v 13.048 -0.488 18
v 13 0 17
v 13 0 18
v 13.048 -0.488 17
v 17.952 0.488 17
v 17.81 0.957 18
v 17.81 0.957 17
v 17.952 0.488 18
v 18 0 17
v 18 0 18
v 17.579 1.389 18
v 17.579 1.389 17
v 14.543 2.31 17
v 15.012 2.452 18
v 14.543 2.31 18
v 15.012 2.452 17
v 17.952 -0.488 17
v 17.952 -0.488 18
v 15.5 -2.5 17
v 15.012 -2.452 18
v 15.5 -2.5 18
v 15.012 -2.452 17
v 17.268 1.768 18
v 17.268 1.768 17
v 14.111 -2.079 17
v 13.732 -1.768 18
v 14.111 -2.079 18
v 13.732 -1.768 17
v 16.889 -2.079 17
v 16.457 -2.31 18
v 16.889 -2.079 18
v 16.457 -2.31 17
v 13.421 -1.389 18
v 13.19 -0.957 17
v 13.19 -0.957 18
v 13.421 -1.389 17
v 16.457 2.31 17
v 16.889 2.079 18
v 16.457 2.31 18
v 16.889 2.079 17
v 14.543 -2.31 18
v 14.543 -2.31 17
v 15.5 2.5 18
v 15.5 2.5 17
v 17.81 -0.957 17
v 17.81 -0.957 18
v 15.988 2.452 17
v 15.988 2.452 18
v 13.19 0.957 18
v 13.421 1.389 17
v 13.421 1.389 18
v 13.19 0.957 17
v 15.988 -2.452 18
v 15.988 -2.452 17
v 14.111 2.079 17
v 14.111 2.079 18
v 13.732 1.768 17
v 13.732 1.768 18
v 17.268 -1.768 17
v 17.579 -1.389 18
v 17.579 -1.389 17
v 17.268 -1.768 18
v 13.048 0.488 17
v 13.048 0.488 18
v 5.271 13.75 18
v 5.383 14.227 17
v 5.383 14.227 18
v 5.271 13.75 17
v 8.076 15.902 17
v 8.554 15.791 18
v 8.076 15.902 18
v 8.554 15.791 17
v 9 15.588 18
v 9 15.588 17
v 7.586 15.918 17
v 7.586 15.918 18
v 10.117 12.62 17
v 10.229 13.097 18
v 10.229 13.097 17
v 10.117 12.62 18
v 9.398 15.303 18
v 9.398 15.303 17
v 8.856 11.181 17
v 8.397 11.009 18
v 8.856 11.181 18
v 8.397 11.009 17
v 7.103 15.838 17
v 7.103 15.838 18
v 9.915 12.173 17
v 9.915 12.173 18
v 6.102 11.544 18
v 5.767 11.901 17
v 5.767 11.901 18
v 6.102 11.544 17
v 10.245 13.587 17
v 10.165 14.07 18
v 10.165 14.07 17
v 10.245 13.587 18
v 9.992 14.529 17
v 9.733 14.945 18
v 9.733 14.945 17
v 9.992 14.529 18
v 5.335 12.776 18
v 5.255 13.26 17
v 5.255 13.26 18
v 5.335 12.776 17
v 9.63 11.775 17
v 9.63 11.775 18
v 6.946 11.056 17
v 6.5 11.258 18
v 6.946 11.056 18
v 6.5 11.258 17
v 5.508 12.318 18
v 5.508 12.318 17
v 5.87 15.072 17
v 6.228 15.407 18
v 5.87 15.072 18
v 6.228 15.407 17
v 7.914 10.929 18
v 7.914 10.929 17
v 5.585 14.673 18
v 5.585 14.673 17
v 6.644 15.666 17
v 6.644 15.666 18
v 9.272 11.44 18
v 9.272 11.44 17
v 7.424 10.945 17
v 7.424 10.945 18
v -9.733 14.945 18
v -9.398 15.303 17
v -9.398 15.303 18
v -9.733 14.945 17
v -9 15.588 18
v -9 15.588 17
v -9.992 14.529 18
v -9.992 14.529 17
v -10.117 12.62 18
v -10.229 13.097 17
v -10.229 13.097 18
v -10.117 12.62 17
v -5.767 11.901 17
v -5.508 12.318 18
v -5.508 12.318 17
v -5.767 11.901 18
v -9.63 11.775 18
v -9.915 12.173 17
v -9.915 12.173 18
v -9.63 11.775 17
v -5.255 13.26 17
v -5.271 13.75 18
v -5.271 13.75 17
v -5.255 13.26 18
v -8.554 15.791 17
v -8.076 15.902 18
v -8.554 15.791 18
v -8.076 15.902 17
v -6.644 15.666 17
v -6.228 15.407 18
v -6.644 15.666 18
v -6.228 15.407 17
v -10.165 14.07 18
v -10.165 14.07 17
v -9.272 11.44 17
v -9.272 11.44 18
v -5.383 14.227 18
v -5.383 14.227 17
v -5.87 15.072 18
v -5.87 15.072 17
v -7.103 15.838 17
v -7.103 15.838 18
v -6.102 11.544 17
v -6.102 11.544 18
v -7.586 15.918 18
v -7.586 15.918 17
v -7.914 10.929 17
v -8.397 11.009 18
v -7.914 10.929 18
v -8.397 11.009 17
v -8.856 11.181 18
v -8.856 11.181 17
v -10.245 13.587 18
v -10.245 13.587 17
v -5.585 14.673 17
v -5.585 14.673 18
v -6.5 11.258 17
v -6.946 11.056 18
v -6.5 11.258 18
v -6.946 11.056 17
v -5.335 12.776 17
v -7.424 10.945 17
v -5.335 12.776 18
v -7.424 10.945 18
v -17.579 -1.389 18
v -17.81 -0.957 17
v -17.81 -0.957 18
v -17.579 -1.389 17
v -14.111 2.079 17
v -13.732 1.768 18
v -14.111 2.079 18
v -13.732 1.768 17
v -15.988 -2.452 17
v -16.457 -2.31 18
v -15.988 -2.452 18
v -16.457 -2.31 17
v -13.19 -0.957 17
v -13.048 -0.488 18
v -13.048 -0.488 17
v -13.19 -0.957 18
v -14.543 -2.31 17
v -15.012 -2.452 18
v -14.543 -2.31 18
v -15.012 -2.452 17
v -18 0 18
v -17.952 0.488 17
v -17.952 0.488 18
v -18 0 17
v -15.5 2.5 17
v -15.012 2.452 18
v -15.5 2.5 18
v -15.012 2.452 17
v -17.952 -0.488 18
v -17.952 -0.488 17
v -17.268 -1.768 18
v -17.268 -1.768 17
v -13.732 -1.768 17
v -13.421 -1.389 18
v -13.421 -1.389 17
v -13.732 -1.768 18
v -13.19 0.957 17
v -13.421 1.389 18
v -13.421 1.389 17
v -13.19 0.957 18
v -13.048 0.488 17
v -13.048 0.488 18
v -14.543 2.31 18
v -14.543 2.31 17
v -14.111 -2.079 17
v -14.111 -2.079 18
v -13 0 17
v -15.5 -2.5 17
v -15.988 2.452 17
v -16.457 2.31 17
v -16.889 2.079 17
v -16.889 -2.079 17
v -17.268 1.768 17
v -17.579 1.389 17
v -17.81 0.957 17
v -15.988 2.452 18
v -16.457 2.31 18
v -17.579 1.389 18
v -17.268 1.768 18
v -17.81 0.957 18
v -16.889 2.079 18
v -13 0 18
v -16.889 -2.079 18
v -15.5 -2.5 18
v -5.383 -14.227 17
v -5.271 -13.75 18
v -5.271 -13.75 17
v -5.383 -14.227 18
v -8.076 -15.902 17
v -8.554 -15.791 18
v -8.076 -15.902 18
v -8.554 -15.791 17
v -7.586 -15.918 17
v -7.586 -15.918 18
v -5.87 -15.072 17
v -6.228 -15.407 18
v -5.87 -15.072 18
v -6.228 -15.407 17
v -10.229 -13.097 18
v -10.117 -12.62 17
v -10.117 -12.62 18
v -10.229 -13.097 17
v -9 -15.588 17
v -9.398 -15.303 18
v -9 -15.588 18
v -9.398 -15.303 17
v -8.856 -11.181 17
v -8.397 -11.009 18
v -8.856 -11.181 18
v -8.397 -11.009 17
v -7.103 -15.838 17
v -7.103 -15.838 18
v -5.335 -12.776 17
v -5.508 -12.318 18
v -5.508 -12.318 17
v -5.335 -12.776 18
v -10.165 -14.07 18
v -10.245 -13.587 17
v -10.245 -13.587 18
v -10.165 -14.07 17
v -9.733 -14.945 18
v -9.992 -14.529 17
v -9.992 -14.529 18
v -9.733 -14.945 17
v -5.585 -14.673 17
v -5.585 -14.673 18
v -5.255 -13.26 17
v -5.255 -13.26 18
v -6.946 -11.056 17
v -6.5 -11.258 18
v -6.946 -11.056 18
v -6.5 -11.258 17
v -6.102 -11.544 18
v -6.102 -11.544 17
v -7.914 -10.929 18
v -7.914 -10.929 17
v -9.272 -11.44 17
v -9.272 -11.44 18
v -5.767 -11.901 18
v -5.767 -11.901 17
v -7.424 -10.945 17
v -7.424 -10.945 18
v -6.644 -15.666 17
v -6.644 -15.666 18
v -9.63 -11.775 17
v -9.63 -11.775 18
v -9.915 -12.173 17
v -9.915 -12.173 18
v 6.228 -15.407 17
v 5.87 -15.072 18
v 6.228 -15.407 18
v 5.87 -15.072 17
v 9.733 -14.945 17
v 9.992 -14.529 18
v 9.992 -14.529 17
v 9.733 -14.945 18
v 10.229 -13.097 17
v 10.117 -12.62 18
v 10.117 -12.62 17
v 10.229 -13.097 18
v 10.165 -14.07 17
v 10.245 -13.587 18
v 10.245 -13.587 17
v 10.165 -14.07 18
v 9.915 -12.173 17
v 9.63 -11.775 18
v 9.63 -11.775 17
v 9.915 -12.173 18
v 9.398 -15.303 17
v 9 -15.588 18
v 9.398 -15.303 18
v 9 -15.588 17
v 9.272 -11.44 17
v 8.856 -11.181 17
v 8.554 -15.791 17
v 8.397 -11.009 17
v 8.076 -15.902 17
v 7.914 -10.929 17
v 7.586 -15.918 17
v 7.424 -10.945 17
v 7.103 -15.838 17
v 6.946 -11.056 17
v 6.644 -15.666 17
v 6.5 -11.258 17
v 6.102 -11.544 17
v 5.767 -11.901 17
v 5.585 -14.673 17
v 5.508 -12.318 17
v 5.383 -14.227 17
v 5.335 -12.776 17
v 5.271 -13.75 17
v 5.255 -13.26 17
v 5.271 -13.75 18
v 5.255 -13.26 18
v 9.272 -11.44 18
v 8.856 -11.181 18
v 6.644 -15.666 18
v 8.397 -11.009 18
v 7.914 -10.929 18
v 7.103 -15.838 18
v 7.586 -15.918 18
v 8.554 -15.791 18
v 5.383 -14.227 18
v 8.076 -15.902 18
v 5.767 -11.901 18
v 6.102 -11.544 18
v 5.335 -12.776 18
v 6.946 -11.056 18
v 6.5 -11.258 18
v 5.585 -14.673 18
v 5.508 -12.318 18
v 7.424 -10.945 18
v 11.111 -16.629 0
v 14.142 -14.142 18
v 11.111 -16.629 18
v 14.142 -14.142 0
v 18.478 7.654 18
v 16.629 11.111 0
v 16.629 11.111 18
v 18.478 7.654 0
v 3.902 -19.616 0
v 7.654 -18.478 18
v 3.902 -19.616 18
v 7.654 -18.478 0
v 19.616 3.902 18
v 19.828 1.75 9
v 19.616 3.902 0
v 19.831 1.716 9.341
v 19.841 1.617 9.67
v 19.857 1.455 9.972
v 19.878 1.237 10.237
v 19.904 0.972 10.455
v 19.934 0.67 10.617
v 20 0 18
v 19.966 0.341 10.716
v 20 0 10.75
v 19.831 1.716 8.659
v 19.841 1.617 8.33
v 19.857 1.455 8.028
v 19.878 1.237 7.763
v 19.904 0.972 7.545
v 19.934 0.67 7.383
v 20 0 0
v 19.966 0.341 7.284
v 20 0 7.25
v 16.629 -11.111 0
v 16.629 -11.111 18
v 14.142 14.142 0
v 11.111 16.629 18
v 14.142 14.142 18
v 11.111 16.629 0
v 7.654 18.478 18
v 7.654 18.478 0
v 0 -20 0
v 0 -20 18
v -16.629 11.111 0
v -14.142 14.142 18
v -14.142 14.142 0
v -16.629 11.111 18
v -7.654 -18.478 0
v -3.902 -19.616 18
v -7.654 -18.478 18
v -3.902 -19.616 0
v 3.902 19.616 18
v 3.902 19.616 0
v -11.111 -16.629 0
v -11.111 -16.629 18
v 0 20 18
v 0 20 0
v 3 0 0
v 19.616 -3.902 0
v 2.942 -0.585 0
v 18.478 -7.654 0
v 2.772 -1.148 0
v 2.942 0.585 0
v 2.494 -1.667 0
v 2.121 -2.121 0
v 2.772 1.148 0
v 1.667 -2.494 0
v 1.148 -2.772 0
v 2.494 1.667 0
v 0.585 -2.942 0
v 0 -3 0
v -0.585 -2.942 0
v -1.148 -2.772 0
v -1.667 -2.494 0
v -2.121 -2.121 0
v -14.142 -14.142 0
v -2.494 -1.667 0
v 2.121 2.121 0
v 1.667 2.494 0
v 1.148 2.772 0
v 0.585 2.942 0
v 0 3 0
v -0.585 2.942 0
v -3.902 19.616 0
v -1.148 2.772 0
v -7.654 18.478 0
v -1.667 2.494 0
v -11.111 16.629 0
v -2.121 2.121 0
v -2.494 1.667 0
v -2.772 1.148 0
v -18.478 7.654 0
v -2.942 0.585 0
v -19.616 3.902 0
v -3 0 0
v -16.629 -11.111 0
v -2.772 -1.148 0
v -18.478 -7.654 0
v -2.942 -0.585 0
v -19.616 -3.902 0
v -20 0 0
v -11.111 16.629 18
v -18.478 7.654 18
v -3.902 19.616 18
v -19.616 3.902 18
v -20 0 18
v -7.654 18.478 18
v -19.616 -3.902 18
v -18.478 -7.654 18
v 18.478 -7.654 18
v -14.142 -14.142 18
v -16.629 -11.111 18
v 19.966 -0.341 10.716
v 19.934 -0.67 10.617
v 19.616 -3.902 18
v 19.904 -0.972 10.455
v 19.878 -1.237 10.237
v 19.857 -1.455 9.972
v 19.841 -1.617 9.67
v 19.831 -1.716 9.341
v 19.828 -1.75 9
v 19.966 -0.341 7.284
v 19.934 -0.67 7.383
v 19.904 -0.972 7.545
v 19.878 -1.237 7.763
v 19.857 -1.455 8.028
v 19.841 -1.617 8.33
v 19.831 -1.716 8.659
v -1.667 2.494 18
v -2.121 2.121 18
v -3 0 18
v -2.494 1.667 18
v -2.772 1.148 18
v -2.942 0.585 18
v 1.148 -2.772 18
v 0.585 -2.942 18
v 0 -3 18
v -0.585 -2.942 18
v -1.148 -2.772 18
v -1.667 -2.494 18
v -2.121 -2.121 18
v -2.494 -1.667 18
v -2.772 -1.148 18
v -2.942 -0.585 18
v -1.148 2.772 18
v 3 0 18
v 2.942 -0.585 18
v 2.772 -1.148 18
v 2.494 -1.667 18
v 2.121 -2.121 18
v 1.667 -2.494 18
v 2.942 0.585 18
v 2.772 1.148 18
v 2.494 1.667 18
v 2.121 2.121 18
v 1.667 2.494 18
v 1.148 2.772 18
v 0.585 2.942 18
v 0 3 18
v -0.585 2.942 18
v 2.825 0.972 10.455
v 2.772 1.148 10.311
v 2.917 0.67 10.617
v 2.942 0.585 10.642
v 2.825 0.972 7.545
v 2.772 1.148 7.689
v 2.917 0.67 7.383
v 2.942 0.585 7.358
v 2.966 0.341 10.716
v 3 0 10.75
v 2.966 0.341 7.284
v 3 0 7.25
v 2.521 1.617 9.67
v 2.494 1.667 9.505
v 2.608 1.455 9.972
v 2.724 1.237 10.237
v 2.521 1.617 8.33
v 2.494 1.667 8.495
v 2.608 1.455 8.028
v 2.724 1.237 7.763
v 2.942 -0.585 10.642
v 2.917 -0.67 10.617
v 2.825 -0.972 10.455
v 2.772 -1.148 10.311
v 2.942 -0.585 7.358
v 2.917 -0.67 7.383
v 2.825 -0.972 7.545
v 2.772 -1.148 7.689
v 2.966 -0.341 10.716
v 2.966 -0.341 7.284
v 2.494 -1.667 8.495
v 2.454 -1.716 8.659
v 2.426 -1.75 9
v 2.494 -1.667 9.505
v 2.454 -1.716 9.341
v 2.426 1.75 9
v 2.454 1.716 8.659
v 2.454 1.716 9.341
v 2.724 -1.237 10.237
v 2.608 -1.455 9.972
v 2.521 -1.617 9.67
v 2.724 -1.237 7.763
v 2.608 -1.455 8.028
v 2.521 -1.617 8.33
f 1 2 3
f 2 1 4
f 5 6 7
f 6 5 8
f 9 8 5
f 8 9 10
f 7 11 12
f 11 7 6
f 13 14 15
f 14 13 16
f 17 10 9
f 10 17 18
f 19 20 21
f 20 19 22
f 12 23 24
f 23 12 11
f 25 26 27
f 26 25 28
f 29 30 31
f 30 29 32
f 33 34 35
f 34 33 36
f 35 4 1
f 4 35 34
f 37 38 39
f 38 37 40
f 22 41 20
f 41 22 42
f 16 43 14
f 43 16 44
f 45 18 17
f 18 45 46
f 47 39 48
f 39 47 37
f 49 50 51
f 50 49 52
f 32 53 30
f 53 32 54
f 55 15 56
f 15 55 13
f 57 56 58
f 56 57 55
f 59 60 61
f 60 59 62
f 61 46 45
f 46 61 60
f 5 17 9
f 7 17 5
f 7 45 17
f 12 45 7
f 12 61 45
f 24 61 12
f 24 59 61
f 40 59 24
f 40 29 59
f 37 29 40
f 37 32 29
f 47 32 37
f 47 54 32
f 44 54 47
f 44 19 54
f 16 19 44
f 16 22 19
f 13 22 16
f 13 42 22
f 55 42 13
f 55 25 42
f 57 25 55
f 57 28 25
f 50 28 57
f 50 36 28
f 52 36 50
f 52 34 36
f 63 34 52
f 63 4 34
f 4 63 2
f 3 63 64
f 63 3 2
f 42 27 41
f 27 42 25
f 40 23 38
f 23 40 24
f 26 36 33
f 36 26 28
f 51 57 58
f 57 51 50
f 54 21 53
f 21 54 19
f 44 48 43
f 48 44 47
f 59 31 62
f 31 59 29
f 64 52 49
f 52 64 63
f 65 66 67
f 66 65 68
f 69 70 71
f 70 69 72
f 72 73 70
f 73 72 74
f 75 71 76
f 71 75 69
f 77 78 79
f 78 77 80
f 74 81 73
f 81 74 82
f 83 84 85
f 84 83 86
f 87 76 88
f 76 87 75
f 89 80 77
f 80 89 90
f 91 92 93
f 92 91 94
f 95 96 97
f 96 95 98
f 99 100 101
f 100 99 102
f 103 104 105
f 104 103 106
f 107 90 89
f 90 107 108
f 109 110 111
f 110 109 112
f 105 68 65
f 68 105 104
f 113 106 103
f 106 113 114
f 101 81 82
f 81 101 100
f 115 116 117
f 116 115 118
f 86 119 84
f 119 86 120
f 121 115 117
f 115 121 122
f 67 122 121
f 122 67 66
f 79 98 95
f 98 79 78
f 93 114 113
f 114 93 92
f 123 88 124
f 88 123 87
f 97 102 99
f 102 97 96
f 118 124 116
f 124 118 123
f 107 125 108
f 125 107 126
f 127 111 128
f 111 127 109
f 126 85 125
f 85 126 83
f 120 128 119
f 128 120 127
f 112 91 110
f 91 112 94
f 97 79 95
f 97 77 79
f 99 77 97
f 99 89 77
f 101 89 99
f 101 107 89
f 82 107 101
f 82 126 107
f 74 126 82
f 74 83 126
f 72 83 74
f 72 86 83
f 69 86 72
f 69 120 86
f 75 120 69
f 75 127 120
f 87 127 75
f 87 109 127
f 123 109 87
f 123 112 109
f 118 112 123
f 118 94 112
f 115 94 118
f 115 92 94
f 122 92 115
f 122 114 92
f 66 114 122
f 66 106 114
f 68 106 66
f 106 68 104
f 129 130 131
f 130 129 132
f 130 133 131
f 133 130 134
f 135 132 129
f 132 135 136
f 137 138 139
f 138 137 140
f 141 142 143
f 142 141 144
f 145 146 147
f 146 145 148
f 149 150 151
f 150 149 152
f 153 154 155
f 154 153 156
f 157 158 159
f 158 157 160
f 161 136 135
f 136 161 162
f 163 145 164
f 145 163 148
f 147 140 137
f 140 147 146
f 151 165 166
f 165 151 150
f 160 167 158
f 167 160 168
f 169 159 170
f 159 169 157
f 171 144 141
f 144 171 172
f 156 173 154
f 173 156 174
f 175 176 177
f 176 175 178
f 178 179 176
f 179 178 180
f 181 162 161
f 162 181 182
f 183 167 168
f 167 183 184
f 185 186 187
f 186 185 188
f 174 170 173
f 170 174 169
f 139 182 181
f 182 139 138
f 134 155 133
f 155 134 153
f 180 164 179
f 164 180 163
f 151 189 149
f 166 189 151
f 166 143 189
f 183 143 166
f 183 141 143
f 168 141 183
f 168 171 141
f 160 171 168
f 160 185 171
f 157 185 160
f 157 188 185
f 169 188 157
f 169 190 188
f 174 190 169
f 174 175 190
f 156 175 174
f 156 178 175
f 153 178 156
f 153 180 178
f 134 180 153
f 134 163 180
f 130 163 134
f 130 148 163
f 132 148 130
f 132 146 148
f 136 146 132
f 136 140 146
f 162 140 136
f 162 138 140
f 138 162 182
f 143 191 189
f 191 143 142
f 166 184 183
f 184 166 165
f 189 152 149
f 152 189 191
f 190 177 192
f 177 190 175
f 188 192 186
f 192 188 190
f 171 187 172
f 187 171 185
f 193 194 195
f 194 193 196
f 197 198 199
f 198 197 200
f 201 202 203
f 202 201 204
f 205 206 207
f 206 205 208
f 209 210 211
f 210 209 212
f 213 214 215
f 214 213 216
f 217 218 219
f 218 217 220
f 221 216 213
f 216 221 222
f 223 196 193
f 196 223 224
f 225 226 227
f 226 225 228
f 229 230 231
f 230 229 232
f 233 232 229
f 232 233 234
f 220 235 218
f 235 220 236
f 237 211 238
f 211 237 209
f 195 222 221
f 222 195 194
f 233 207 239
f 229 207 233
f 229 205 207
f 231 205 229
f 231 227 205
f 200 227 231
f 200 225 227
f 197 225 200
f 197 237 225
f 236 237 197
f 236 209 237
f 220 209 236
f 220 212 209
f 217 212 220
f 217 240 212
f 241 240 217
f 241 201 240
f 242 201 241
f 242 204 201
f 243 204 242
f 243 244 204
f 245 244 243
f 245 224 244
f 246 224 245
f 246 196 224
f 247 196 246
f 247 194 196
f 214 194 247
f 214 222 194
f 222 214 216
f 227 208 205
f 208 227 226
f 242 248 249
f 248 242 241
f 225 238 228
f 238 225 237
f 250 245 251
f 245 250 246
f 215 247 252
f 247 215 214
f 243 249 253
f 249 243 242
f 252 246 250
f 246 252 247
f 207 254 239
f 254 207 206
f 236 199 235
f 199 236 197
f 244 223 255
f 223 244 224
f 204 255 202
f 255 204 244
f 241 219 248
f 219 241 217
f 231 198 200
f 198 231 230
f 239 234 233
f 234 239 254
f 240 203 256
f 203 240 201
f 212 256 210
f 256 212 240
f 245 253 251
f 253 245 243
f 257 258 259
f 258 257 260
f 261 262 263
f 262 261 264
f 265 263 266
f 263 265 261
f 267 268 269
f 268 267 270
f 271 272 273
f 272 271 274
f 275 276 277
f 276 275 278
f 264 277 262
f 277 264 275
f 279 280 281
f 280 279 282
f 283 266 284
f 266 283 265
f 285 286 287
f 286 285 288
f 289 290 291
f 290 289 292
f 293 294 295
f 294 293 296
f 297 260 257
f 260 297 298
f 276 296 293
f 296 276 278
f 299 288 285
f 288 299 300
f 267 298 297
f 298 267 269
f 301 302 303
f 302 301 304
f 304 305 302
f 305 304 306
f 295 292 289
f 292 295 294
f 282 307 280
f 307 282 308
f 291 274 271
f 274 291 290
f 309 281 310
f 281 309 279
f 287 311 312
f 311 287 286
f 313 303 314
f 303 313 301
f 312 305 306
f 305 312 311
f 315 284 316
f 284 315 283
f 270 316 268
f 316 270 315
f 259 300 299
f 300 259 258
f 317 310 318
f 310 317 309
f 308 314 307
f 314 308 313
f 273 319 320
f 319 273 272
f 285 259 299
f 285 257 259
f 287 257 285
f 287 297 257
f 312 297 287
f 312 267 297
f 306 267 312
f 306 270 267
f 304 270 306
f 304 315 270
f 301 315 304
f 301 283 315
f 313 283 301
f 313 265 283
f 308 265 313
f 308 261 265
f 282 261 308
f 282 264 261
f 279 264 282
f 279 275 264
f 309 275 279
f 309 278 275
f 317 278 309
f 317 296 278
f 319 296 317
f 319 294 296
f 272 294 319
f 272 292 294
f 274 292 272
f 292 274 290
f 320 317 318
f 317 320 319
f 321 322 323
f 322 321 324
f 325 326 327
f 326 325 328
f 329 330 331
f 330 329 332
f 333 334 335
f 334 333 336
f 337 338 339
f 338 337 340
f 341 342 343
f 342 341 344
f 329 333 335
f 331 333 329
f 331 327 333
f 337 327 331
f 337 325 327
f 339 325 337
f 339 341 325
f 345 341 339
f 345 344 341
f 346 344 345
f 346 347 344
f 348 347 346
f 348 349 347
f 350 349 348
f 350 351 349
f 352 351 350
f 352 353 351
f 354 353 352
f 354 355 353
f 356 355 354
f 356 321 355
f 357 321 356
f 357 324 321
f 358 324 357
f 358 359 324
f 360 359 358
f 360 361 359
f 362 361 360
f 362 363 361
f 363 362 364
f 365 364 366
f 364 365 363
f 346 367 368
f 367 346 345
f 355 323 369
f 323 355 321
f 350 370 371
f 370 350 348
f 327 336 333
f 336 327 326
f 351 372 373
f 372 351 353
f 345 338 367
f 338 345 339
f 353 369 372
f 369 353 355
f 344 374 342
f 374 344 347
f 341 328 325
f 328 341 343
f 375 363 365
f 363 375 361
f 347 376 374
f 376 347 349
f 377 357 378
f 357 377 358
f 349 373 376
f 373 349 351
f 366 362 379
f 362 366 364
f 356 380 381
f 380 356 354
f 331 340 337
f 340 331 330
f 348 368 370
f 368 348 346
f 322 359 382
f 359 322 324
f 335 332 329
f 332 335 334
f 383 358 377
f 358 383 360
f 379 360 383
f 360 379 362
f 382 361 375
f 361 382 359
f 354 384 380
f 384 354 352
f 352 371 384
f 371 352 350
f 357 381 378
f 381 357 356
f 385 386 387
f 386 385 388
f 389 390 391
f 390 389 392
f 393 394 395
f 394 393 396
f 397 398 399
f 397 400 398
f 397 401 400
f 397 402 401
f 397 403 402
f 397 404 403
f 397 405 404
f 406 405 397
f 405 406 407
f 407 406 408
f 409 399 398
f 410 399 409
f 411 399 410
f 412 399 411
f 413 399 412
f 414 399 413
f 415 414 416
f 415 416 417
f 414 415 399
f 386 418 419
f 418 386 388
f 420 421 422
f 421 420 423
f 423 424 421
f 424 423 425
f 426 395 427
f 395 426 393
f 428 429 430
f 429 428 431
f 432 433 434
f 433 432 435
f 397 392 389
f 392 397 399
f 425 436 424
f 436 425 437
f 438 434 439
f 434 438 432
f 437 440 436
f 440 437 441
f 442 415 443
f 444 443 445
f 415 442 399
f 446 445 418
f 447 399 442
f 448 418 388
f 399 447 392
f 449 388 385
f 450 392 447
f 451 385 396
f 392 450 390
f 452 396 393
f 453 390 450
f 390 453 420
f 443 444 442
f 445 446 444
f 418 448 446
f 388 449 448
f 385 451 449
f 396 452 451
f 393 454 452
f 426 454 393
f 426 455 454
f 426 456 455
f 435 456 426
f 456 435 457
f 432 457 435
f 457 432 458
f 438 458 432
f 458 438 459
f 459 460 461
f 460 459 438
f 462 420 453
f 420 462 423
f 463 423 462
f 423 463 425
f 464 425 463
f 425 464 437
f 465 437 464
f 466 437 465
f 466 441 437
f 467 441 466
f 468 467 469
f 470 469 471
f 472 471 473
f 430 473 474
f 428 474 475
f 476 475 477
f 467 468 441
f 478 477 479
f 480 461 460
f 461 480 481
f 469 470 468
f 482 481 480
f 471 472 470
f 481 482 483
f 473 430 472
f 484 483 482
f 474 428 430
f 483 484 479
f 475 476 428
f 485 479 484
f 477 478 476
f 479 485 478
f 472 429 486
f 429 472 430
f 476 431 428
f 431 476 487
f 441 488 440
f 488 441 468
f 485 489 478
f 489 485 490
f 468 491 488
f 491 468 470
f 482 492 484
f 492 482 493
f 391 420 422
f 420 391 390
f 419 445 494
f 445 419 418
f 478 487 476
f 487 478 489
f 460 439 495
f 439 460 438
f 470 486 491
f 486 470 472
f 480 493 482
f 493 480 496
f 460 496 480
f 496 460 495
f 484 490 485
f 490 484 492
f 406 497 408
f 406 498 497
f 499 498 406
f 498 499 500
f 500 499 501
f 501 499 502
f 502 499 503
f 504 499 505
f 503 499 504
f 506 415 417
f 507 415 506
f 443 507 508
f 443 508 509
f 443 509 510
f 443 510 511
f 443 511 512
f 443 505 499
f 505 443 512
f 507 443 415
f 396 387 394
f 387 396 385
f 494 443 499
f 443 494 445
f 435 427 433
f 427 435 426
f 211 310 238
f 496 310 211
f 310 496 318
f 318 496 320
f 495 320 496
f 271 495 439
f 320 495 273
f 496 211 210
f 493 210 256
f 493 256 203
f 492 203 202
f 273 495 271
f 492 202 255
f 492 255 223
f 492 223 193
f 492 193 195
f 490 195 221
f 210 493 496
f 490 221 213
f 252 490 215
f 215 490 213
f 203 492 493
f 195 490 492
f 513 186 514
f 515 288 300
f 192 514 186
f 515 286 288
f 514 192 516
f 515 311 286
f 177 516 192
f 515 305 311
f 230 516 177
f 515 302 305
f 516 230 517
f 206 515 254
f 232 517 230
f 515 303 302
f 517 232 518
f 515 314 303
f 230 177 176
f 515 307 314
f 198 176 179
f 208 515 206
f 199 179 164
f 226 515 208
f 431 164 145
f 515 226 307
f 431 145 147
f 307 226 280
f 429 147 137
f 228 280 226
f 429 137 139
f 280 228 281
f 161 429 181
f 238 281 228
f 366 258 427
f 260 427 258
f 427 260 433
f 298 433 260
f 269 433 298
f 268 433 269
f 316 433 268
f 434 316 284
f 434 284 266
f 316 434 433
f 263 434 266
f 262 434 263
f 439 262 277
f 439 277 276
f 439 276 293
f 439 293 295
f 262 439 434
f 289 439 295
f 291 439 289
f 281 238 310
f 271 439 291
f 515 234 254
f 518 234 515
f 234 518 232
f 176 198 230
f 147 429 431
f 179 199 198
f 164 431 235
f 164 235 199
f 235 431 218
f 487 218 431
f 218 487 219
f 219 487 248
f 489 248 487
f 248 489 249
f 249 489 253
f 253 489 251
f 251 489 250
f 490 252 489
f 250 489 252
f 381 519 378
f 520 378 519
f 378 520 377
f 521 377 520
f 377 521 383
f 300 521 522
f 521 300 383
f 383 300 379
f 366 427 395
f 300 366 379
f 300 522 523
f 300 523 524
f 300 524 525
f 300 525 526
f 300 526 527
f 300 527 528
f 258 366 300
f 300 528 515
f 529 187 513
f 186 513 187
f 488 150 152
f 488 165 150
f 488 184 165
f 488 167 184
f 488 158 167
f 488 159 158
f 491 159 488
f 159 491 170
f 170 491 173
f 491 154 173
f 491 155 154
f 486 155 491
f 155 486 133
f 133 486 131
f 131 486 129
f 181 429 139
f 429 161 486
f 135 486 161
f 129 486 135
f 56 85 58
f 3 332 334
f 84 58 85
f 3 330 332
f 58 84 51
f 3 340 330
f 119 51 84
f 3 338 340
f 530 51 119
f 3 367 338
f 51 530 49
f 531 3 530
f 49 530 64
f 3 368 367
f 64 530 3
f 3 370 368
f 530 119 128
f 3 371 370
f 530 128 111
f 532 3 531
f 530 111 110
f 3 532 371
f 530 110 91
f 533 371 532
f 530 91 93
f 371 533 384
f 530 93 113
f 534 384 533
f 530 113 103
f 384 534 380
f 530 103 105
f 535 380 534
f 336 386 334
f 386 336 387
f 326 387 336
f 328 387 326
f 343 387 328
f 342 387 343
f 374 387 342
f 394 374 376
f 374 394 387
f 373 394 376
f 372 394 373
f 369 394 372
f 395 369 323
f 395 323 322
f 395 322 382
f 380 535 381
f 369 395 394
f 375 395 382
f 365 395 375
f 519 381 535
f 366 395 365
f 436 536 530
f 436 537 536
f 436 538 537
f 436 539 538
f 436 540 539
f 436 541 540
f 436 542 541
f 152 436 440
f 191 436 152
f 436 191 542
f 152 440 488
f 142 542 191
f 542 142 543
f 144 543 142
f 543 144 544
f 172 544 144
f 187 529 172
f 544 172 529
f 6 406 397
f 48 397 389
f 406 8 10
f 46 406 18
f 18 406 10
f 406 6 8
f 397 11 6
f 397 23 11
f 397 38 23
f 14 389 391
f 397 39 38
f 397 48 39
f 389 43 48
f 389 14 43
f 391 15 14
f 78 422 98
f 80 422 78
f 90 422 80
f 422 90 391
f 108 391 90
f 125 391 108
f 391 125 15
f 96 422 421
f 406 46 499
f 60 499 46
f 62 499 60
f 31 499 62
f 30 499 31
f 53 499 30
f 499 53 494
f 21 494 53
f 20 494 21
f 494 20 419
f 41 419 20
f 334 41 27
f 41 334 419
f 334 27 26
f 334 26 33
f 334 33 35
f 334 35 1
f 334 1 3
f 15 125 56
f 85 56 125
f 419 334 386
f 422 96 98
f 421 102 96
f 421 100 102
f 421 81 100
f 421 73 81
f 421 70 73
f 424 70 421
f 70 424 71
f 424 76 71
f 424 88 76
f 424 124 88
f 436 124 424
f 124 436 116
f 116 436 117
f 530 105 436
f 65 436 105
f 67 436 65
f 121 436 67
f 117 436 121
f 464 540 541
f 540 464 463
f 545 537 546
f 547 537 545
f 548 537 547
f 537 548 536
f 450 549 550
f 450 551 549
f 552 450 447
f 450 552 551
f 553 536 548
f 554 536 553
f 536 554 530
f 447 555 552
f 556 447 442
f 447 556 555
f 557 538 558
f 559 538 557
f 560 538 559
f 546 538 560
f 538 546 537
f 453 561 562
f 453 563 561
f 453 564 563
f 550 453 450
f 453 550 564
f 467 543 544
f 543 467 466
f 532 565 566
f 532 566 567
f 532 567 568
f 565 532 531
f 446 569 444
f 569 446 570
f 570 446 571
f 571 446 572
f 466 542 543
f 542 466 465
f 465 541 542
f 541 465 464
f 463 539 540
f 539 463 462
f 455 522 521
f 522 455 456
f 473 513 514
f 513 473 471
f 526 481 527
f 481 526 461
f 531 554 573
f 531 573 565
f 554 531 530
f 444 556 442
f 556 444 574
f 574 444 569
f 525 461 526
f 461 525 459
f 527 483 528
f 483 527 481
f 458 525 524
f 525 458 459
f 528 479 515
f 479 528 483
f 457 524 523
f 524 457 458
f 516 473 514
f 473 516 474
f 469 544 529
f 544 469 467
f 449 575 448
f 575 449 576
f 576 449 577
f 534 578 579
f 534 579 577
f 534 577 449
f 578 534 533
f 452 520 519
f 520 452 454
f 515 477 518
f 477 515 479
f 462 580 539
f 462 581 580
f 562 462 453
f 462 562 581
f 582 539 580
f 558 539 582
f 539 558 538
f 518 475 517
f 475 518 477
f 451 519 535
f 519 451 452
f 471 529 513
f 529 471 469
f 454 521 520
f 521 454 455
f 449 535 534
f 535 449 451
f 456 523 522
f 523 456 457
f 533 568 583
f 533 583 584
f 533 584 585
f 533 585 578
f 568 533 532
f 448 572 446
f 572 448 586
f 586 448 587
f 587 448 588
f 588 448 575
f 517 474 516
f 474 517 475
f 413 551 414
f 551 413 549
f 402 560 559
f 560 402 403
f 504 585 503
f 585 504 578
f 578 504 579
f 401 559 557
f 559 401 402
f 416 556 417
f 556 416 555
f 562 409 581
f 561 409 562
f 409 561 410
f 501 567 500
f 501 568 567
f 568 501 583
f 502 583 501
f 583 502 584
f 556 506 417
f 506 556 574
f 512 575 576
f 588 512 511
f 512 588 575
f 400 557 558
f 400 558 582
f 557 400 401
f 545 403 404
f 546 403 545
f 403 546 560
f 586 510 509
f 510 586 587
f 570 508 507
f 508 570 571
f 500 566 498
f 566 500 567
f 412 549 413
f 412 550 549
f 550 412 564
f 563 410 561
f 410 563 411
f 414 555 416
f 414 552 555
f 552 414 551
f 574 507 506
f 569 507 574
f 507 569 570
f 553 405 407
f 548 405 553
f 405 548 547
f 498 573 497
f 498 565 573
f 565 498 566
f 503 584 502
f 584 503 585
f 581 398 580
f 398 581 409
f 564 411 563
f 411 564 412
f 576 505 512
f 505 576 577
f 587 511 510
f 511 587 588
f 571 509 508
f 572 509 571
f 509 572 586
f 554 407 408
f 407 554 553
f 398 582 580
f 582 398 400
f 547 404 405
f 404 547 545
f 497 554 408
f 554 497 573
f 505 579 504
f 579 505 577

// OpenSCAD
$fn = 32;

// ----------------------------------------------------------------------
// Control knob: dimpled knob
// ----------------------------------------------------------------------

// --- parameters (mm) ---
dimp_d = 5;               // finger dimple diameter
n_dimp = 6;               // number of dimples
dimp_r = 15.5;            // dimple ring radius
knob_d = 40;              // knob body diameter
knob_h = 18;              // knob body height
bore_d = 6;               // shaft bore diameter
set_d = 3.5;              // set screw bore diameter

dimp_step = 360 / n_dimp;  // dimple angular step

difference() {
  cylinder(h = knob_h, d = knob_d);
  translate([0, 0, -1]) cylinder(h = knob_h + 2, d = bore_d);
  translate([-1, 0, knob_h / 2]) rotate([0, 90, 0])
    cylinder(h = knob_d / 2 + bore_d / 2 + 2, d = set_d);  for (i = [0 : n_dimp - 1])
    rotate([0, 0, i * dimp_step])
      translate([dimp_r, 0, knob_h - 1])
        cylinder(h = 2, d = dimp_d);
}
